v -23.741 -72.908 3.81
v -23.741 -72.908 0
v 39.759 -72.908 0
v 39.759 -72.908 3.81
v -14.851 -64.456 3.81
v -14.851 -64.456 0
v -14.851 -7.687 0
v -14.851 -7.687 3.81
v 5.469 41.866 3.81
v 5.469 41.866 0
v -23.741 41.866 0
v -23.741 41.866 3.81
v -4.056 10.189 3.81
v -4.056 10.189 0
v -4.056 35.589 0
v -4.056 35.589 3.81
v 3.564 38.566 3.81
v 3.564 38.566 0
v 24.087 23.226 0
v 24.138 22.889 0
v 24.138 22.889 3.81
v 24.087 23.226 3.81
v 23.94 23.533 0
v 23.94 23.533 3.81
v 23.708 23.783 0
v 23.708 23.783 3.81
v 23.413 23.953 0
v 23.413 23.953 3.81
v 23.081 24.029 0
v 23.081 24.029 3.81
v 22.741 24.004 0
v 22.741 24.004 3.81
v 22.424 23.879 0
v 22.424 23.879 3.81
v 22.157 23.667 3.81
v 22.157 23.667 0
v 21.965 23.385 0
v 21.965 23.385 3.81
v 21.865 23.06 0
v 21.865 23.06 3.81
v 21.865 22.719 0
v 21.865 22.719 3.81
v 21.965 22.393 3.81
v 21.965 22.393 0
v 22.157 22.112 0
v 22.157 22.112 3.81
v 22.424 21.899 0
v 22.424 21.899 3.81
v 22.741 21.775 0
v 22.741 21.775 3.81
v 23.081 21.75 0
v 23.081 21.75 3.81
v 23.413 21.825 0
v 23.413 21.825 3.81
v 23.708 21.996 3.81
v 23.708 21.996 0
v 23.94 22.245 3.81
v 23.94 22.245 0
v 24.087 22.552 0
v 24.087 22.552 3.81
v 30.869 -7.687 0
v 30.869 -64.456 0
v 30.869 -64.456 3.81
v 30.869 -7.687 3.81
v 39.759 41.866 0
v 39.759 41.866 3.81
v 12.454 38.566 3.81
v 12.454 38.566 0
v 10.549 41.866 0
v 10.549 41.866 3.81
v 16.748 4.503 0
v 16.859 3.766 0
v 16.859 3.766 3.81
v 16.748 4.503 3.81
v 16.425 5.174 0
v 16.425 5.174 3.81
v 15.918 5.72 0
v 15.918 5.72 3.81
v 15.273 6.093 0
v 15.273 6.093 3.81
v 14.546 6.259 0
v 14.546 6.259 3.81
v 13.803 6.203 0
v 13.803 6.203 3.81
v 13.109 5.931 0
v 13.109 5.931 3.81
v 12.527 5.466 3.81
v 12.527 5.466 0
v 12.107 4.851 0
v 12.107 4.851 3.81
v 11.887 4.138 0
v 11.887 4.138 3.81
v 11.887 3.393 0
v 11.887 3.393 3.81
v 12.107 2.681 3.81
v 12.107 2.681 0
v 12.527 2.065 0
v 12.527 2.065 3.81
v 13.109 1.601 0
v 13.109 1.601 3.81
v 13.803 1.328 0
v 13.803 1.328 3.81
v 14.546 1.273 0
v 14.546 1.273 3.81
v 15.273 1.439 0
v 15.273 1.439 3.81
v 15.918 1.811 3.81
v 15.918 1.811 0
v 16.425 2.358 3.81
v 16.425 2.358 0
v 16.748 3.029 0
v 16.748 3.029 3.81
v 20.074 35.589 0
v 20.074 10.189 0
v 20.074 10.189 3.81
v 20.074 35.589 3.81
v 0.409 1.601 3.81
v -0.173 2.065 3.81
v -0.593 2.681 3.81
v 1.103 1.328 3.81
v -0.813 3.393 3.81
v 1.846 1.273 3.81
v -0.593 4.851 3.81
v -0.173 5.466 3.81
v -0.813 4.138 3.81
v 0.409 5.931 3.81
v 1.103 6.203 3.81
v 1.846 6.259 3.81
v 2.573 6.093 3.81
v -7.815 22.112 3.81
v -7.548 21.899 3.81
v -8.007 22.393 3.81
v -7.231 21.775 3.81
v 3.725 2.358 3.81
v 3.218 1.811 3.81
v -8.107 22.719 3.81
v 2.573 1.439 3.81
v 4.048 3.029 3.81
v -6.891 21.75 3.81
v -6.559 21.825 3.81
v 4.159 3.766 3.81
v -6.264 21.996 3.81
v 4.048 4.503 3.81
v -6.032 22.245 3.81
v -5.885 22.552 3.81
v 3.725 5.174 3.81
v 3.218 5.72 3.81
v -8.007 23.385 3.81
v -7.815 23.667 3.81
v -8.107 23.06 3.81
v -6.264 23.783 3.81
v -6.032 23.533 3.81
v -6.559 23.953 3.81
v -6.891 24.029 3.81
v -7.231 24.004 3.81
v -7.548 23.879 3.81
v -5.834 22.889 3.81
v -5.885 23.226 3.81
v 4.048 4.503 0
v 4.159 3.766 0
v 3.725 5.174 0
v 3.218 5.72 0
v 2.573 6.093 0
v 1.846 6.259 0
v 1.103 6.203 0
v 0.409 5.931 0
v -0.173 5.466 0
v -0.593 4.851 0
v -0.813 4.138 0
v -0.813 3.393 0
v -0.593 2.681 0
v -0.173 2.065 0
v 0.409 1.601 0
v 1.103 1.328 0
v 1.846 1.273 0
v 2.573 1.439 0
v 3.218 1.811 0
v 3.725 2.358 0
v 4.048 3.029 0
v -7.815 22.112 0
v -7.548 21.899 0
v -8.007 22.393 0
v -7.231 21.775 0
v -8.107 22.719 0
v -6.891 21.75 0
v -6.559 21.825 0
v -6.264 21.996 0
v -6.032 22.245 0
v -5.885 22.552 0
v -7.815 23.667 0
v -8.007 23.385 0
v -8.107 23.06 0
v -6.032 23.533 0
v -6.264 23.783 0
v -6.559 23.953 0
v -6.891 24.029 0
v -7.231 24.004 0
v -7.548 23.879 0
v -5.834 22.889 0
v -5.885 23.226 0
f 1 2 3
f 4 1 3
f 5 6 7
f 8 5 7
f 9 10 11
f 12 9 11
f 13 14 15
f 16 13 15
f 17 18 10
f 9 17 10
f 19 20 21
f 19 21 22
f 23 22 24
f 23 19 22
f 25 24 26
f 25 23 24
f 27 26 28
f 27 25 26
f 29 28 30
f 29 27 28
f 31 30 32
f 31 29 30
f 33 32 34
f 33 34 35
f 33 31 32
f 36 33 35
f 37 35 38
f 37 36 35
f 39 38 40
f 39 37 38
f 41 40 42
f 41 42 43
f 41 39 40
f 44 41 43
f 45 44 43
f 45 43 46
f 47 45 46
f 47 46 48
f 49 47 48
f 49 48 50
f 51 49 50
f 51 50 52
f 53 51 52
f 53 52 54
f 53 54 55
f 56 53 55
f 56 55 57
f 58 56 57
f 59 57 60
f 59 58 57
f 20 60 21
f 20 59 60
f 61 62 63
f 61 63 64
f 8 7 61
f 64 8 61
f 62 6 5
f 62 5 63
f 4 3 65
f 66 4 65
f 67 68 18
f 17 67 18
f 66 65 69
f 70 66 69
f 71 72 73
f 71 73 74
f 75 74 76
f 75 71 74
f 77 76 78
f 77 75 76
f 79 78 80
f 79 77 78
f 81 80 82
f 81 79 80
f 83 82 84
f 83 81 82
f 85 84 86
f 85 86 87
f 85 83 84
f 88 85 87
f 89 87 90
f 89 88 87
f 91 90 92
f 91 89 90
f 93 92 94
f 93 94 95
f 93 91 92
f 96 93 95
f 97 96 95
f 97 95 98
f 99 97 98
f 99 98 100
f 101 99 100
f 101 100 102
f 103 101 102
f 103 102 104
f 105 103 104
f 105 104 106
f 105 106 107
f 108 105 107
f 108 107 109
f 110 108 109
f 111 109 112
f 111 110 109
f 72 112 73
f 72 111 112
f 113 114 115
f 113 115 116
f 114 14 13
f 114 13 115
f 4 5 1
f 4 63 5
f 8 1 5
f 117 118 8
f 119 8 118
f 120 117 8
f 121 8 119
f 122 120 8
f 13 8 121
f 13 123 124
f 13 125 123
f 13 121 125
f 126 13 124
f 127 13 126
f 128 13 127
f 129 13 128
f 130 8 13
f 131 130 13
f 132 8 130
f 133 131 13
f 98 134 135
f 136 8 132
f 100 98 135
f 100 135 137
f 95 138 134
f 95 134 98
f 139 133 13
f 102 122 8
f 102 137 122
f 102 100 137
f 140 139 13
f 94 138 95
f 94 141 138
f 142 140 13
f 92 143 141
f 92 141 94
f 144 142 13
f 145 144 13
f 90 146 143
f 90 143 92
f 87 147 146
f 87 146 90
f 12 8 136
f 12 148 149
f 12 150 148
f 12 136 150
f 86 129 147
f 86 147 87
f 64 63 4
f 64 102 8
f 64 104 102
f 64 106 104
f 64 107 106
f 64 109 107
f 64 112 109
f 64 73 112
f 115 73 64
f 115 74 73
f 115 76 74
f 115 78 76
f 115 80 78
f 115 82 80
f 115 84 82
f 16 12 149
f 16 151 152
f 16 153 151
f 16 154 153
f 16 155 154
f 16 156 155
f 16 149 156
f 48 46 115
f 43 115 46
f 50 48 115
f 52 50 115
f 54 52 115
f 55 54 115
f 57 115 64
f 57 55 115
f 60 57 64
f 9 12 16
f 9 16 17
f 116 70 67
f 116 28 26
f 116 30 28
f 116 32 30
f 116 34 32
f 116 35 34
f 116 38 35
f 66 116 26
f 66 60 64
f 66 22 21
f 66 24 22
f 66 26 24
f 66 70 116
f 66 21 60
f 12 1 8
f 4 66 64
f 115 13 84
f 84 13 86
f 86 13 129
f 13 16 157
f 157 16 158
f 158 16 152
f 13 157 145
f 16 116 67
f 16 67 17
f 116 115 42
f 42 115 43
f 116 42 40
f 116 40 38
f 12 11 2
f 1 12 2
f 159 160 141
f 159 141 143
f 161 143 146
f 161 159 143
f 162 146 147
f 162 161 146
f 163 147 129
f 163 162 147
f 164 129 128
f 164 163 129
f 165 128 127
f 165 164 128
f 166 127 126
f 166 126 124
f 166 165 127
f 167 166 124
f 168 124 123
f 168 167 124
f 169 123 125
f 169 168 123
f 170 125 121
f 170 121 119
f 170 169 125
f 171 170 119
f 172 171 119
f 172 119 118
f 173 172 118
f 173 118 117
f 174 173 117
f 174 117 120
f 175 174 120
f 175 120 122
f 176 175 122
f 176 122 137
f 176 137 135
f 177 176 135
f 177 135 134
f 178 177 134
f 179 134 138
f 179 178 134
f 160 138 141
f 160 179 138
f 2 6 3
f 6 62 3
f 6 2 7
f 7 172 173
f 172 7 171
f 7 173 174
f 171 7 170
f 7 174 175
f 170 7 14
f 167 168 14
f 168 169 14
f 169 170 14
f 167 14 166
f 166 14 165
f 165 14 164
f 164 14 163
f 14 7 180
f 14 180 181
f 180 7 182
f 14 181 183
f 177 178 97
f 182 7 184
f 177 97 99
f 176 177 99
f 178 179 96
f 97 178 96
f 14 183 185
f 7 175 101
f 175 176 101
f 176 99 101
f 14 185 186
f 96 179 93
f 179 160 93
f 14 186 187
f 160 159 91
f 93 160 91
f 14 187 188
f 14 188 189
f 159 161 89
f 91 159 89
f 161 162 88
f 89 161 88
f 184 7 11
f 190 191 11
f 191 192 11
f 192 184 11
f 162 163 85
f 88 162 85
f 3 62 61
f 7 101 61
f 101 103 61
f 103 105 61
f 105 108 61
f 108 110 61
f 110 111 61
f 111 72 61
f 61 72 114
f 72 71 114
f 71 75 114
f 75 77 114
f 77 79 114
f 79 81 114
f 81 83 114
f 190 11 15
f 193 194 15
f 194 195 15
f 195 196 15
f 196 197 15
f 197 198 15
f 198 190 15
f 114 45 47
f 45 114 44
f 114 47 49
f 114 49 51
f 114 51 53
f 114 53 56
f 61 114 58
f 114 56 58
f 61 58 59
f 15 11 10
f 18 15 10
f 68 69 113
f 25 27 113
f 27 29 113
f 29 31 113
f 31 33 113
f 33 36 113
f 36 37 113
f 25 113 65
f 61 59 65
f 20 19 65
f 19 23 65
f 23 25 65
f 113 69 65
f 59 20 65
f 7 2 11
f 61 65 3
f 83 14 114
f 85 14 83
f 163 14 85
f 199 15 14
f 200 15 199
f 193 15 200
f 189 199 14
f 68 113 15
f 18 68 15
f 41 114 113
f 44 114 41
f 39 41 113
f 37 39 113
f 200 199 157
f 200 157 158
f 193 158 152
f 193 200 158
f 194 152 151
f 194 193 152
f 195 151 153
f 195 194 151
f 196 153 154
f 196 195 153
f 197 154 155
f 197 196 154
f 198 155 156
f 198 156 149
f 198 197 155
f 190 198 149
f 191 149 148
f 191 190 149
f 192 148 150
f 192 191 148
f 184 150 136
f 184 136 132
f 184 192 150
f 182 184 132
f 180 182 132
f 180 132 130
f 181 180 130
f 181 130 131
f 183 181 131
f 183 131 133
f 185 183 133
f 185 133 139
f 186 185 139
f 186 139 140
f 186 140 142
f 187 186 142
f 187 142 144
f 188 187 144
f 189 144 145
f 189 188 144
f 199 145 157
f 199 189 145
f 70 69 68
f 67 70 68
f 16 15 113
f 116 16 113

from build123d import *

# Parameters (mm, degrees)
F0_W     = 45.72
F0_H     = 56.769
F0_R     = 2.5
F0_R_2   = 1.143
F0_W_2   = 24.13
F0_H_2   = 25.4
F1_DEPTH = 3.81


with BuildPart() as f1:
    # F0 (on Top) → F1 (new body)
    with BuildSketch(Plane.XY):
        Polygon((5.469258, 41.86581), (-17.390742, 41.86581), (-23.740742, 41.86581), (-23.740742, -47.508215), (-23.740742, -72.908215), (39.759258, -72.908215), (39.759258, 41.86581), (33.409258, 41.86581), (10.549258, 41.86581), (12.454258, 38.566253), (3.564258, 38.566253), align=None)
        with Locations((8.009258, -36.071789)):
            Rectangle(F0_W, F0_H, mode=Mode.SUBTRACT)
        with Locations((1.659258, 3.76581)):
            Circle(F0_R, mode=Mode.SUBTRACT)
        with Locations((-6.976742, 22.889307)):
            Circle(F0_R_2, mode=Mode.SUBTRACT)
        with Locations((8.009258, 22.889307)):
            Rectangle(F0_W_2, F0_H_2, mode=Mode.SUBTRACT)
        with Locations((14.359258, 3.76581)):
            Circle(F0_R, mode=Mode.SUBTRACT)
        with Locations((22.995258, 22.889307)):
            Circle(F0_R_2, mode=Mode.SUBTRACT)
    extrude(amount=F1_DEPTH)


solid = f1.part
